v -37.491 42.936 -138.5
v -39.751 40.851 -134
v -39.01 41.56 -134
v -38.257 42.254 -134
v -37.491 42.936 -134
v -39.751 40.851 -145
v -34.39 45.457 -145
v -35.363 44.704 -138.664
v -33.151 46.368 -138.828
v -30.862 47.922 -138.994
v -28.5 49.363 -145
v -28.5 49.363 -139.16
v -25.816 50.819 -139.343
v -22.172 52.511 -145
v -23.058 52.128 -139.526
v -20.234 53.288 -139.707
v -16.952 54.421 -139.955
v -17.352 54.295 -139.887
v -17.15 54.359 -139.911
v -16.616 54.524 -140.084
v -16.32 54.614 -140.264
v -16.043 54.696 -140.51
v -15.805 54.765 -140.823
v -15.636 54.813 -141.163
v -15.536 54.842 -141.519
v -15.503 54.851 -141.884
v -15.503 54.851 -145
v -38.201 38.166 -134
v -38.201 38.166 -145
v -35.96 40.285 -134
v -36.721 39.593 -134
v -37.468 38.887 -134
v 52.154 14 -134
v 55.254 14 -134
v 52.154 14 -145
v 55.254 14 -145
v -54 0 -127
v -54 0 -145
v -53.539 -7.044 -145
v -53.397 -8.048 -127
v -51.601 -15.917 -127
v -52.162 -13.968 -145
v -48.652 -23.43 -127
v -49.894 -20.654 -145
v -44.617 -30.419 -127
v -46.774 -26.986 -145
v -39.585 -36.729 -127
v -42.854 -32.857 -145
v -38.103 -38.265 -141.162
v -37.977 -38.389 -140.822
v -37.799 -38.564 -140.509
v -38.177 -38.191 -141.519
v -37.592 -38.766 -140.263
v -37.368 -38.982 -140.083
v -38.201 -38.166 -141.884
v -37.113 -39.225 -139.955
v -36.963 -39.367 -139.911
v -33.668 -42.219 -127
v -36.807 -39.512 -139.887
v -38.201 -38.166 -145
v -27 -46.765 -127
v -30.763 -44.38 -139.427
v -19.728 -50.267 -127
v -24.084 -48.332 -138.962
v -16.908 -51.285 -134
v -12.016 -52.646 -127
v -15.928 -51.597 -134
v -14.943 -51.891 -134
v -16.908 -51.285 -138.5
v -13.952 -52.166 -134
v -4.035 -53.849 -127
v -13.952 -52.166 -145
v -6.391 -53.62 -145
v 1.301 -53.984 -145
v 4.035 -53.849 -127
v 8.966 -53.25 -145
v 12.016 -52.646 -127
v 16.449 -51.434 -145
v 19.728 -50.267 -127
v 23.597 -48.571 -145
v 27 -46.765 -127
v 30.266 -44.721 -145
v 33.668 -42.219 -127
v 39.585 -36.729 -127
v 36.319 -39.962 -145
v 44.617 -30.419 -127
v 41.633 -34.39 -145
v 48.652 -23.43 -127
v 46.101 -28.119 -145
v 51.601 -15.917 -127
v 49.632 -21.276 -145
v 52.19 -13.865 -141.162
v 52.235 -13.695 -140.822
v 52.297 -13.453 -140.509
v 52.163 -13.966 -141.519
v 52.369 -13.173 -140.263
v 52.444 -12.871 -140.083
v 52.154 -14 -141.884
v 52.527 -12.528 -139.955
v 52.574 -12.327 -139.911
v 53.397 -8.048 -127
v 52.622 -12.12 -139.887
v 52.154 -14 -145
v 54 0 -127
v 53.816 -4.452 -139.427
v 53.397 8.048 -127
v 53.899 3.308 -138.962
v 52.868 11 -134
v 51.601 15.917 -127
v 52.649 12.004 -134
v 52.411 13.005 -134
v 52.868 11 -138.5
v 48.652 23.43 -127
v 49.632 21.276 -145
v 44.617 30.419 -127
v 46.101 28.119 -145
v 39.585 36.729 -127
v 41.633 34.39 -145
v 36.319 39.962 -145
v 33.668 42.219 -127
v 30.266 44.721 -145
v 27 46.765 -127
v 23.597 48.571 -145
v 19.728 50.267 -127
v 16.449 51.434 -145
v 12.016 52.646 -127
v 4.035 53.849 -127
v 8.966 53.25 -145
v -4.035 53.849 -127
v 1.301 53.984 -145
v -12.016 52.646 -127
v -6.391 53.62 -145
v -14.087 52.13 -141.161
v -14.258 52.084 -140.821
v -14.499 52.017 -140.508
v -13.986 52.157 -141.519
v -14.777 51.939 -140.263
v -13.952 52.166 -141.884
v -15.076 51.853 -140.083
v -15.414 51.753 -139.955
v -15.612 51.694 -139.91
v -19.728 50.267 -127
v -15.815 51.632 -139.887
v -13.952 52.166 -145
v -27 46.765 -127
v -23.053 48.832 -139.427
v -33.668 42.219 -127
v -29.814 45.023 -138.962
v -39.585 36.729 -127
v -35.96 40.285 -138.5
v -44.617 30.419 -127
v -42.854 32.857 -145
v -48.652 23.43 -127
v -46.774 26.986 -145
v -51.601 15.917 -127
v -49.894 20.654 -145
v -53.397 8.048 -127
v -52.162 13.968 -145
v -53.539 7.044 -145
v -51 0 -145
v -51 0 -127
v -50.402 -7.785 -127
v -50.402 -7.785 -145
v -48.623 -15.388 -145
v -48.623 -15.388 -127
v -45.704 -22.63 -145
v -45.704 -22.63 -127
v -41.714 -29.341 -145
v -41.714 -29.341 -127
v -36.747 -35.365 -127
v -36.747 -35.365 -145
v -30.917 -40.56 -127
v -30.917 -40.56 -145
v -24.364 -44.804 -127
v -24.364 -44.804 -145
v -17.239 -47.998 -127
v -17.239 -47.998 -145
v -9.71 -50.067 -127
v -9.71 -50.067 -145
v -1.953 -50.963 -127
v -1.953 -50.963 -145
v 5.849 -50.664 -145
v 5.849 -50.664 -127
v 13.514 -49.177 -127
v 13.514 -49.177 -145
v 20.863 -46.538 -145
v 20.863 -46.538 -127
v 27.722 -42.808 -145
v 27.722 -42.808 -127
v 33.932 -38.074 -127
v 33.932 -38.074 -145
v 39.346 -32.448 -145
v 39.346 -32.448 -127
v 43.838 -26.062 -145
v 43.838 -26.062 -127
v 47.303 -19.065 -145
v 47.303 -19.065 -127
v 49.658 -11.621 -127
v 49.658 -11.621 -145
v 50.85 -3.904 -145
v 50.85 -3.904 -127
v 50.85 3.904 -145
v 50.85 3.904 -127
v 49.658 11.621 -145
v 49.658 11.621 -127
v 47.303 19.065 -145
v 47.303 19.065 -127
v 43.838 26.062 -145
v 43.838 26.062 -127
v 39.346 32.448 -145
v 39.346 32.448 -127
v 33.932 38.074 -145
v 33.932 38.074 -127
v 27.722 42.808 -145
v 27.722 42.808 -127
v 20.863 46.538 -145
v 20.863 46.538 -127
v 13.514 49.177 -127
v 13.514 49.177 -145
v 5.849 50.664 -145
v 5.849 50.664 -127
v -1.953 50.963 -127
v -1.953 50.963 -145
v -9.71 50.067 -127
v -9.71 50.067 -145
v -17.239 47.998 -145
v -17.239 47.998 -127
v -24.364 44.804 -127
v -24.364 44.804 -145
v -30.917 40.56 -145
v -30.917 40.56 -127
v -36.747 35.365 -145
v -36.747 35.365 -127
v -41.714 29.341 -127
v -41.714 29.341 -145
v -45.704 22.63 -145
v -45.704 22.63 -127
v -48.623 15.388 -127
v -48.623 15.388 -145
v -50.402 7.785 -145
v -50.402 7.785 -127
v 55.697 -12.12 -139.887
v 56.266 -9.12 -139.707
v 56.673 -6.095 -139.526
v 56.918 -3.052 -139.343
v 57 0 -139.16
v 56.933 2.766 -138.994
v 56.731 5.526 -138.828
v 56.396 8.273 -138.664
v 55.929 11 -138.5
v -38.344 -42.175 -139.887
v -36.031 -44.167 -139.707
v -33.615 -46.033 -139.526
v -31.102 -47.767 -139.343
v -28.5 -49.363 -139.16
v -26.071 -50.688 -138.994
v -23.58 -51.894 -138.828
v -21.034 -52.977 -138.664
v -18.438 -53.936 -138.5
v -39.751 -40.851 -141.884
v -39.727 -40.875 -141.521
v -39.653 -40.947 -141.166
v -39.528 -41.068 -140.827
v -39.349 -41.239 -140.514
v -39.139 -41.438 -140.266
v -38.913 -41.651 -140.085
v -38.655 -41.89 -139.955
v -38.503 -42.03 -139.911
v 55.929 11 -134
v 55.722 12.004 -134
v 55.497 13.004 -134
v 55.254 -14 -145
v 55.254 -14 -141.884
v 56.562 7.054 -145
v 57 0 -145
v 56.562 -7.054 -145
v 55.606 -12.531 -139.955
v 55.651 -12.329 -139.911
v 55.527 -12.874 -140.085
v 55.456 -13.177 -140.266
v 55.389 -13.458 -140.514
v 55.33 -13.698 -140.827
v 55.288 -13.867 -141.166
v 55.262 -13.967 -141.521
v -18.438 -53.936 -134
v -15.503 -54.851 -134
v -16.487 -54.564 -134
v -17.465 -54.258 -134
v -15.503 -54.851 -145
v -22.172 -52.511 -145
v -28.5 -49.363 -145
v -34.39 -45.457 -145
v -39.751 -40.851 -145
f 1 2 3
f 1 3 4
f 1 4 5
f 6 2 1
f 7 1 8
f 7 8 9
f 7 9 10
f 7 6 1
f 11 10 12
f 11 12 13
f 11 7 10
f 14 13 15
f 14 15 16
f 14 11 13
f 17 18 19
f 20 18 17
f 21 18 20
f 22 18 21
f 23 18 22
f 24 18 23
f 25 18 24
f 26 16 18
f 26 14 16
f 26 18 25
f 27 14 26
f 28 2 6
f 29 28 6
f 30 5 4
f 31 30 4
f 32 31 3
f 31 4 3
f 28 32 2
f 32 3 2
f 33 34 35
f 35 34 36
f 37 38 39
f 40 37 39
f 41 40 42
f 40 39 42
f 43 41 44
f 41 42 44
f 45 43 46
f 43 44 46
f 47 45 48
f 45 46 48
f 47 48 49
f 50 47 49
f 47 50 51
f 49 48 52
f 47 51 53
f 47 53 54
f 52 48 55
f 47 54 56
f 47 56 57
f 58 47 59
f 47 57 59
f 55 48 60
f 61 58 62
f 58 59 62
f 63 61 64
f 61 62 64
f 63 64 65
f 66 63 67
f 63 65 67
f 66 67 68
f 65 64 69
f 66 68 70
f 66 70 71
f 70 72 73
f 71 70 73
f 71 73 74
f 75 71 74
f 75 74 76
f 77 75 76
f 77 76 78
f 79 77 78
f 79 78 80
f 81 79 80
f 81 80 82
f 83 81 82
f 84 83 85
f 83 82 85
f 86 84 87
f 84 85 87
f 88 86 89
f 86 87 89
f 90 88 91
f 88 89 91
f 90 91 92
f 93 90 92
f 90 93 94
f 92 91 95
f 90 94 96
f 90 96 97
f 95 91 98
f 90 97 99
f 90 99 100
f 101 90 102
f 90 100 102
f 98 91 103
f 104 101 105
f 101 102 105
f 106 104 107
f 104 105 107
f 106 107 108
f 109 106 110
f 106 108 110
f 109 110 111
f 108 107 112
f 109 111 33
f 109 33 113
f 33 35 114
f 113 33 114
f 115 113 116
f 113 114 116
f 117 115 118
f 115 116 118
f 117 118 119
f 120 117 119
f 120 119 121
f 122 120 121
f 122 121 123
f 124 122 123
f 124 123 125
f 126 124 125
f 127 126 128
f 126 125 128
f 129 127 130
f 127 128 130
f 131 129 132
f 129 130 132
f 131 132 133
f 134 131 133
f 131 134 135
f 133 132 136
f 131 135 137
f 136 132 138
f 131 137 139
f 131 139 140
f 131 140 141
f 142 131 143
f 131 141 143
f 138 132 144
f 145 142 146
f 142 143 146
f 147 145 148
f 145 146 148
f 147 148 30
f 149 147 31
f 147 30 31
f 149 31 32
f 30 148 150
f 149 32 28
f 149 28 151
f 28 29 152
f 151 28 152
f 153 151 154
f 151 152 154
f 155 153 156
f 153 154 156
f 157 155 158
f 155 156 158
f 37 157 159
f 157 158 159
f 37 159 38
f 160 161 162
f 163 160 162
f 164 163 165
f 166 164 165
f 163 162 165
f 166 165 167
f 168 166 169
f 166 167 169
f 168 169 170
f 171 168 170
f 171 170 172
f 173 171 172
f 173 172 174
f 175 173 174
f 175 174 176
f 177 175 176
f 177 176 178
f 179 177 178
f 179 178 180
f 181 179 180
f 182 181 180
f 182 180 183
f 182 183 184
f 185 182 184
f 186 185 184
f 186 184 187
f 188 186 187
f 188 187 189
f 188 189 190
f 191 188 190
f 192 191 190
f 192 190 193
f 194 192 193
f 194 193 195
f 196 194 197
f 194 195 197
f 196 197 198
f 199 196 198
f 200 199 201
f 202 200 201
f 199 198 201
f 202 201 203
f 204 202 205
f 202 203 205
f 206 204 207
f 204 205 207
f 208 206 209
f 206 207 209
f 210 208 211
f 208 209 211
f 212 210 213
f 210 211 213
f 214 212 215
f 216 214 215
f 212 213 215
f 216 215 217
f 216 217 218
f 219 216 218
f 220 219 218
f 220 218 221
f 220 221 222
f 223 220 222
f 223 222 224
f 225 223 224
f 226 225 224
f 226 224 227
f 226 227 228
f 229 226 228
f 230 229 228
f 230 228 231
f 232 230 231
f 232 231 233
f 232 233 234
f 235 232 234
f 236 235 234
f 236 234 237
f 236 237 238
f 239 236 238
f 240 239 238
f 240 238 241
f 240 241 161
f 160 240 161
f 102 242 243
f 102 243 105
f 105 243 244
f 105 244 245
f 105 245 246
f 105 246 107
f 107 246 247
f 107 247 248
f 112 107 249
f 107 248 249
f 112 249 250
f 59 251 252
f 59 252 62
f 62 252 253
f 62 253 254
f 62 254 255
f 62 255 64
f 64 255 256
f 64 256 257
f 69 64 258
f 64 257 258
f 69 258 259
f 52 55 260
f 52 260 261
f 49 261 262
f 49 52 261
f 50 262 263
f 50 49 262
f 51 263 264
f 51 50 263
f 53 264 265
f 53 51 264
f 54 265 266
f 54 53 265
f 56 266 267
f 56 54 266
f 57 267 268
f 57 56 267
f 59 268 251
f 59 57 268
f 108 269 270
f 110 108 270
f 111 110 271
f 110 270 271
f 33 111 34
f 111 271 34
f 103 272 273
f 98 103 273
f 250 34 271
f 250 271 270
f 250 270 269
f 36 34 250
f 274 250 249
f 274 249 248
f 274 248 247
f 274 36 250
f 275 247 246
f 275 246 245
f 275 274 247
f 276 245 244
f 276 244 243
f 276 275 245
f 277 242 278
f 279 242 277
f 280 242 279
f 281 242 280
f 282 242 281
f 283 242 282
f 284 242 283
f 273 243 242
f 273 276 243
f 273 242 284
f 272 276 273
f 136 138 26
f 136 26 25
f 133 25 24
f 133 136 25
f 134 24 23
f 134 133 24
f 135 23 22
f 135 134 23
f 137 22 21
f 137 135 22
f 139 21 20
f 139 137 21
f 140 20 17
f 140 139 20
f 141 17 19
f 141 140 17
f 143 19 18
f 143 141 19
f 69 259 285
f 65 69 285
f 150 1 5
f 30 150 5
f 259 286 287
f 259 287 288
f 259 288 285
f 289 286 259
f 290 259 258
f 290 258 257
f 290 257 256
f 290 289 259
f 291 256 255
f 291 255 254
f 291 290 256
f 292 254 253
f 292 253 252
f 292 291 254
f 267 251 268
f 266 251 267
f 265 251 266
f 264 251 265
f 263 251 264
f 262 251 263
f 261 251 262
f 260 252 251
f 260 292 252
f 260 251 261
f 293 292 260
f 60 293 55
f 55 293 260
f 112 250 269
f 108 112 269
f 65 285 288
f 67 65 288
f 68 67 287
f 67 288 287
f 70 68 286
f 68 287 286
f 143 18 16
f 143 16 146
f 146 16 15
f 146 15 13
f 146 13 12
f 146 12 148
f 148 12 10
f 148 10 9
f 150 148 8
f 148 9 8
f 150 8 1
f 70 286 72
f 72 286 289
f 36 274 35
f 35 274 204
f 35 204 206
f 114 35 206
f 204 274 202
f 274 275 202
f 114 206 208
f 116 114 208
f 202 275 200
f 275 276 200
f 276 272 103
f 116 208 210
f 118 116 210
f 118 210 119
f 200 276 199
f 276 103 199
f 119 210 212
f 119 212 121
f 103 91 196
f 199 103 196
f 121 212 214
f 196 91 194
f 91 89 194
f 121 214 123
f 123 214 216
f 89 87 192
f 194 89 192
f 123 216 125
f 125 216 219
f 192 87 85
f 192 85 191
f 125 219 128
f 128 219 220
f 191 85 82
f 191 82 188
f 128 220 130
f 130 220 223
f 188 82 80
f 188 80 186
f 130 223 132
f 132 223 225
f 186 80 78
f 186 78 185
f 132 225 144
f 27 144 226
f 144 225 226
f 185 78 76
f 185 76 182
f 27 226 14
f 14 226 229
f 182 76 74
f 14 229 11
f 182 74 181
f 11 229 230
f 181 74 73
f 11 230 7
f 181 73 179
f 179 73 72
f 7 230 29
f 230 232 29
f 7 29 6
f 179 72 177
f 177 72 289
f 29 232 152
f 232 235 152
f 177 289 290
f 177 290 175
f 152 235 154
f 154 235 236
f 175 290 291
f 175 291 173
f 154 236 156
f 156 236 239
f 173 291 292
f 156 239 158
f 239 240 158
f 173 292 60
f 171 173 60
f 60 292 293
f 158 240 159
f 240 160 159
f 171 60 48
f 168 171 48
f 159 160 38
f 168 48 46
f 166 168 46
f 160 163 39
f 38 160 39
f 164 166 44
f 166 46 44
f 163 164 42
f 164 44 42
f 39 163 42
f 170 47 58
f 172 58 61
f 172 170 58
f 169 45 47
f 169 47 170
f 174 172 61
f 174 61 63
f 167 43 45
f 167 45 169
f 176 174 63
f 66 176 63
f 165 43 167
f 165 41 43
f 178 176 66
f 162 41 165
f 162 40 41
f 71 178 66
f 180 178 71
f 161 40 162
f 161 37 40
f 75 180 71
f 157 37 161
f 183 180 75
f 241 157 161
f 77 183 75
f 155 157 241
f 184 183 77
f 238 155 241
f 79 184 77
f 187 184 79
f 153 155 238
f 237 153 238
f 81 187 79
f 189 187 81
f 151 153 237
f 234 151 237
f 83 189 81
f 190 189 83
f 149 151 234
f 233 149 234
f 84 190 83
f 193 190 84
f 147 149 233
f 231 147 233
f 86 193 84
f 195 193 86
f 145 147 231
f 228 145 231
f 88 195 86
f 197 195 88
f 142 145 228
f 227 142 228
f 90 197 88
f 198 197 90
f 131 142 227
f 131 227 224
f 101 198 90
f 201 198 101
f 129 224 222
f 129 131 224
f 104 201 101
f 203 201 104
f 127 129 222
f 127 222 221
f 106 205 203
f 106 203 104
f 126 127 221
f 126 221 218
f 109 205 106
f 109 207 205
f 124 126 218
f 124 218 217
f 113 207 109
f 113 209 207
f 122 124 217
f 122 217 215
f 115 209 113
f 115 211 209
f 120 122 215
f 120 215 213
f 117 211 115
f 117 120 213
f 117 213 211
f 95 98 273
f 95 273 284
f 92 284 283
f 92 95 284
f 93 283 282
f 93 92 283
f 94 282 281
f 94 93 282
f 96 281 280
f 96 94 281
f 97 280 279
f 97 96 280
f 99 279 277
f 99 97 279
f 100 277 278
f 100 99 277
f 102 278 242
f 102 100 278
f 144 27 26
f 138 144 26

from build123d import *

# Parameters (mm, degrees)
EXTRUDE_1_DEPTH                  = 10
FILLET_1_R                       = 2
PATTERN_CIRCULAR_2_COUNT         = 3
FILLET_1_OF_PATTERN_CIRCULAR_2_R = 2
CUT_EXTRUDE_START                = -15
SKETCH_3_R                       = 51
CUT_EXTRUDE_1_DEPTH              = 15
SKETCH_4_R                       = 62.618720145
SKETCH_4_R_2                     = 57
CUT_EXTRUDE_2_DEPTH              = 15
CHAMFER_1_SIZE                   = 2
FILLET_2_R                       = 5
SKETCH_5_R                       = 42.5
EXTRUDE_2_DEPTH                  = 3
SKETCH_7_R                       = 39.5
CUT_EXTRUDE_3_DEPTH              = 3
EXTRUDE_START                    = 3
SKETCH_8_W                       = 3
SKETCH_8_H                       = 3
EXTRUDE_4_DEPTH                  = 3
SKETCH_11_R                      = 73.482680971
CUT_EXTRUDE_4_DEPTH              = 130


with BuildPart() as part:
    # Эскиз1 → Повернуть1 (revolve)
    with BuildSketch(Plane(origin=(0, 0, 0), x_dir=(1, 0, 0), z_dir=(0, 1, 0))):
        Polygon((0, 0), (-54, 0), (-54, 145), (-51, 145), (-51, 3), (0, 3), align=None)
    revolve(axis=Axis((0, 0, -3), (0, 0, 1)))

    # Эскиз2 → Бобышка-Вытянуть1 (add)
    with BuildSketch(Plane(origin=(57, 0, 0), x_dir=(0, 0, -1), z_dir=(1, 0, 0))):
        Polygon((145, 14), (145, -14), (140, -14), (138.5, 11), (134, 11), (134, 14), align=None)
    extrude_1 = extrude(amount=-EXTRUDE_1_DEPTH)

    # Скругление1
    fillet_1_edges = [part.edges().sort_by_distance(p)[0] for p in [
        (54.576809621, -14, -140),
    ]]
    fillet(fillet_1_edges, radius=FILLET_1_R)

    # Круговой массив2: Бобышка-Вытянуть1 ×3 about axis
    pattern_circular_2_axis = Axis((0, 0, 0), (0, 0, 1))
    for i in range(1, PATTERN_CIRCULAR_2_COUNT):
        add(extrude_1.rotate(pattern_circular_2_axis, i * 360 / PATTERN_CIRCULAR_2_COUNT))

    # Скругление1 of Круговой массив2
    fillet_1_of_pattern_circular_2_edges = [part.edges().sort_by_distance(p)[0] for p in [
        (-15.164049157, 54.264903589, -140),
        (-39.412760463, -40.264903589, -140),
    ]]
    fillet(fillet_1_of_pattern_circular_2_edges, radius=FILLET_1_OF_PATTERN_CIRCULAR_2_R)

    # Эскиз3 → Вырез-Вытянуть1 (cut)
    with BuildSketch(Plane(origin=(0, 0, -145), x_dir=(-1, 0, 0), z_dir=(0, 0, -1)).offset(CUT_EXTRUDE_START)):
        Circle(SKETCH_3_R)
    extrude(amount=CUT_EXTRUDE_1_DEPTH, mode=Mode.SUBTRACT)

    # Эскиз4 → Вырез-Вытянуть2 (cut)
    with BuildSketch(Plane(origin=(0, 0, -145), x_dir=(-1, 0, 0), z_dir=(0, 0, -1))):
        Circle(SKETCH_4_R)
        Circle(SKETCH_4_R_2, mode=Mode.SUBTRACT)
    extrude(amount=-CUT_EXTRUDE_2_DEPTH, mode=Mode.SUBTRACT)

    # Фаска1
    chamfer_1_edges = [part.edges().sort_by_distance(p)[0] for p in [
        (54, 0, 0),
    ]]
    chamfer(chamfer_1_edges, length=CHAMFER_1_SIZE)

    # Скругление2
    fillet_2_edges = [part.edges().sort_by_distance(p)[0] for p in [
        (51, 0, -3),
    ]]
    fillet(fillet_2_edges, radius=FILLET_2_R)

    # Эскиз5 → Бобышка-Вытянуть2 (add)
    with BuildSketch(Plane.XY):
        Circle(SKETCH_5_R)
    extrude(amount=EXTRUDE_2_DEPTH)

    # Эскиз7 → Вырез-Вытянуть3 (cut)
    with BuildSketch(Plane.XY.offset(3)):
        Circle(SKETCH_7_R)
    extrude(amount=-CUT_EXTRUDE_3_DEPTH, mode=Mode.SUBTRACT)

    # Эскиз8 → Бобышка-Вытянуть4 (add)
    with BuildSketch(Plane.XY.offset(EXTRUDE_START)):
        with BuildLine():
            Line((-1.5, -7.858116823), (-1.5, -39.471508712))
            ThreePointArc((-1.5, -39.471508712), (0, -39.5), (1.5, -39.471508712))
            Line((1.5, -39.471508712), (1.5, -7.858116823))
            ThreePointArc((1.5, -7.858116823), (0, -8), (-1.5, -7.858116823))
        make_face()
        with BuildLine():
            ThreePointArc((1.5, 39.471508712), (0, 39.5), (-1.5, 39.471508712))
            Line((-1.5, 39.471508712), (-1.5, 7.858116823))
            ThreePointArc((-1.5, 7.858116823), (0, 8), (1.5, 7.858116823))
            Line((1.5, 7.858116823), (1.5, 39.471508712))
        make_face()
        with BuildLine():
            Line((-1.5, 7.858116823), (-1.5, 1.5))
            Line((-1.5, 1.5), (1.5, 1.5))
            Line((1.5, 1.5), (1.5, 7.858116823))
            ThreePointArc((1.5, 7.858116823), (0, 8), (-1.5, 7.858116823))
        make_face()
        with BuildLine():
            Line((1.5, 7.858116823), (1.5, 1.5))
            Line((1.5, 1.5), (7.858116823, 1.5))
            ThreePointArc((7.858116823, 1.5), (5.656854249, 5.656854249), (1.5, 7.858116823))
        make_face()
        with BuildLine():
            Line((1.5, 1.5), (1.5, -1.5))
            Line((1.5, -1.5), (7.858116823, -1.5))
            ThreePointArc((7.858116823, -1.5), (7.964450219, -0.753347668), (8, 0))
            ThreePointArc((8, 0), (7.964450219, 0.753347668), (7.858116823, 1.5))
            Line((7.858116823, 1.5), (1.5, 1.5))
        make_face()
        with BuildLine():
            ThreePointArc((-39.471508712, 1.5), (-39.5, 0), (-39.471508712, -1.5))
            Line((-39.471508712, -1.5), (-7.858116823, -1.5))
            ThreePointArc((-7.858116823, -1.5), (-8, 0), (-7.858116823, 1.5))
            Line((-7.858116823, 1.5), (-39.471508712, 1.5))
        make_face()
        with BuildLine():
            Line((7.858116823, -1.5), (39.471508712, -1.5))
            ThreePointArc((39.471508712, -1.5), (39.492876536, -0.75013528), (39.5, 0))
            ThreePointArc((39.5, 0), (39.492876536, 0.75013528), (39.471508712, 1.5))
            Line((39.471508712, 1.5), (7.858116823, 1.5))
            ThreePointArc((7.858116823, 1.5), (7.964450219, 0.753347668), (8, 0))
            ThreePointArc((8, 0), (7.964450219, -0.753347668), (7.858116823, -1.5))
        make_face()
        with BuildLine():
            Line((1.5, -1.5), (1.5, -7.858116823))
            ThreePointArc((1.5, -7.858116823), (5.656854249, -5.656854249), (7.858116823, -1.5))
            Line((7.858116823, -1.5), (1.5, -1.5))
        make_face()
        with BuildLine():
            Line((-1.5, -1.5), (-1.5, -7.858116823))
            ThreePointArc((-1.5, -7.858116823), (0, -8), (1.5, -7.858116823))
            Line((1.5, -7.858116823), (1.5, -1.5))
            Line((1.5, -1.5), (-1.5, -1.5))
        make_face()
        Rectangle(SKETCH_8_W, SKETCH_8_H)
        with BuildLine():
            Line((-7.858116823, 1.5), (-1.5, 1.5))
            Line((-1.5, 1.5), (-1.5, 7.858116823))
            ThreePointArc((-1.5, 7.858116823), (-5.656854249, 5.656854249), (-7.858116823, 1.5))
        make_face()
        with BuildLine():
            Line((-7.858116823, -1.5), (-1.5, -1.5))
            Line((-1.5, -1.5), (-1.5, 1.5))
            Line((-1.5, 1.5), (-7.858116823, 1.5))
            ThreePointArc((-7.858116823, 1.5), (-8, 0), (-7.858116823, -1.5))
        make_face()
        with BuildLine():
            ThreePointArc((-7.858116823, -1.5), (-5.656854249, -5.656854249), (-1.5, -7.858116823))
            Line((-1.5, -7.858116823), (-1.5, -1.5))
            Line((-1.5, -1.5), (-7.858116823, -1.5))
        make_face()
    extrude(amount=-EXTRUDE_4_DEPTH)

    # Эскиз11 → Вырез-Вытянуть4 (cut)
    with BuildSketch(Plane.XY.offset(3)):
        Circle(SKETCH_11_R)
    extrude(amount=-CUT_EXTRUDE_4_DEPTH, mode=Mode.SUBTRACT)


solid = part.part
